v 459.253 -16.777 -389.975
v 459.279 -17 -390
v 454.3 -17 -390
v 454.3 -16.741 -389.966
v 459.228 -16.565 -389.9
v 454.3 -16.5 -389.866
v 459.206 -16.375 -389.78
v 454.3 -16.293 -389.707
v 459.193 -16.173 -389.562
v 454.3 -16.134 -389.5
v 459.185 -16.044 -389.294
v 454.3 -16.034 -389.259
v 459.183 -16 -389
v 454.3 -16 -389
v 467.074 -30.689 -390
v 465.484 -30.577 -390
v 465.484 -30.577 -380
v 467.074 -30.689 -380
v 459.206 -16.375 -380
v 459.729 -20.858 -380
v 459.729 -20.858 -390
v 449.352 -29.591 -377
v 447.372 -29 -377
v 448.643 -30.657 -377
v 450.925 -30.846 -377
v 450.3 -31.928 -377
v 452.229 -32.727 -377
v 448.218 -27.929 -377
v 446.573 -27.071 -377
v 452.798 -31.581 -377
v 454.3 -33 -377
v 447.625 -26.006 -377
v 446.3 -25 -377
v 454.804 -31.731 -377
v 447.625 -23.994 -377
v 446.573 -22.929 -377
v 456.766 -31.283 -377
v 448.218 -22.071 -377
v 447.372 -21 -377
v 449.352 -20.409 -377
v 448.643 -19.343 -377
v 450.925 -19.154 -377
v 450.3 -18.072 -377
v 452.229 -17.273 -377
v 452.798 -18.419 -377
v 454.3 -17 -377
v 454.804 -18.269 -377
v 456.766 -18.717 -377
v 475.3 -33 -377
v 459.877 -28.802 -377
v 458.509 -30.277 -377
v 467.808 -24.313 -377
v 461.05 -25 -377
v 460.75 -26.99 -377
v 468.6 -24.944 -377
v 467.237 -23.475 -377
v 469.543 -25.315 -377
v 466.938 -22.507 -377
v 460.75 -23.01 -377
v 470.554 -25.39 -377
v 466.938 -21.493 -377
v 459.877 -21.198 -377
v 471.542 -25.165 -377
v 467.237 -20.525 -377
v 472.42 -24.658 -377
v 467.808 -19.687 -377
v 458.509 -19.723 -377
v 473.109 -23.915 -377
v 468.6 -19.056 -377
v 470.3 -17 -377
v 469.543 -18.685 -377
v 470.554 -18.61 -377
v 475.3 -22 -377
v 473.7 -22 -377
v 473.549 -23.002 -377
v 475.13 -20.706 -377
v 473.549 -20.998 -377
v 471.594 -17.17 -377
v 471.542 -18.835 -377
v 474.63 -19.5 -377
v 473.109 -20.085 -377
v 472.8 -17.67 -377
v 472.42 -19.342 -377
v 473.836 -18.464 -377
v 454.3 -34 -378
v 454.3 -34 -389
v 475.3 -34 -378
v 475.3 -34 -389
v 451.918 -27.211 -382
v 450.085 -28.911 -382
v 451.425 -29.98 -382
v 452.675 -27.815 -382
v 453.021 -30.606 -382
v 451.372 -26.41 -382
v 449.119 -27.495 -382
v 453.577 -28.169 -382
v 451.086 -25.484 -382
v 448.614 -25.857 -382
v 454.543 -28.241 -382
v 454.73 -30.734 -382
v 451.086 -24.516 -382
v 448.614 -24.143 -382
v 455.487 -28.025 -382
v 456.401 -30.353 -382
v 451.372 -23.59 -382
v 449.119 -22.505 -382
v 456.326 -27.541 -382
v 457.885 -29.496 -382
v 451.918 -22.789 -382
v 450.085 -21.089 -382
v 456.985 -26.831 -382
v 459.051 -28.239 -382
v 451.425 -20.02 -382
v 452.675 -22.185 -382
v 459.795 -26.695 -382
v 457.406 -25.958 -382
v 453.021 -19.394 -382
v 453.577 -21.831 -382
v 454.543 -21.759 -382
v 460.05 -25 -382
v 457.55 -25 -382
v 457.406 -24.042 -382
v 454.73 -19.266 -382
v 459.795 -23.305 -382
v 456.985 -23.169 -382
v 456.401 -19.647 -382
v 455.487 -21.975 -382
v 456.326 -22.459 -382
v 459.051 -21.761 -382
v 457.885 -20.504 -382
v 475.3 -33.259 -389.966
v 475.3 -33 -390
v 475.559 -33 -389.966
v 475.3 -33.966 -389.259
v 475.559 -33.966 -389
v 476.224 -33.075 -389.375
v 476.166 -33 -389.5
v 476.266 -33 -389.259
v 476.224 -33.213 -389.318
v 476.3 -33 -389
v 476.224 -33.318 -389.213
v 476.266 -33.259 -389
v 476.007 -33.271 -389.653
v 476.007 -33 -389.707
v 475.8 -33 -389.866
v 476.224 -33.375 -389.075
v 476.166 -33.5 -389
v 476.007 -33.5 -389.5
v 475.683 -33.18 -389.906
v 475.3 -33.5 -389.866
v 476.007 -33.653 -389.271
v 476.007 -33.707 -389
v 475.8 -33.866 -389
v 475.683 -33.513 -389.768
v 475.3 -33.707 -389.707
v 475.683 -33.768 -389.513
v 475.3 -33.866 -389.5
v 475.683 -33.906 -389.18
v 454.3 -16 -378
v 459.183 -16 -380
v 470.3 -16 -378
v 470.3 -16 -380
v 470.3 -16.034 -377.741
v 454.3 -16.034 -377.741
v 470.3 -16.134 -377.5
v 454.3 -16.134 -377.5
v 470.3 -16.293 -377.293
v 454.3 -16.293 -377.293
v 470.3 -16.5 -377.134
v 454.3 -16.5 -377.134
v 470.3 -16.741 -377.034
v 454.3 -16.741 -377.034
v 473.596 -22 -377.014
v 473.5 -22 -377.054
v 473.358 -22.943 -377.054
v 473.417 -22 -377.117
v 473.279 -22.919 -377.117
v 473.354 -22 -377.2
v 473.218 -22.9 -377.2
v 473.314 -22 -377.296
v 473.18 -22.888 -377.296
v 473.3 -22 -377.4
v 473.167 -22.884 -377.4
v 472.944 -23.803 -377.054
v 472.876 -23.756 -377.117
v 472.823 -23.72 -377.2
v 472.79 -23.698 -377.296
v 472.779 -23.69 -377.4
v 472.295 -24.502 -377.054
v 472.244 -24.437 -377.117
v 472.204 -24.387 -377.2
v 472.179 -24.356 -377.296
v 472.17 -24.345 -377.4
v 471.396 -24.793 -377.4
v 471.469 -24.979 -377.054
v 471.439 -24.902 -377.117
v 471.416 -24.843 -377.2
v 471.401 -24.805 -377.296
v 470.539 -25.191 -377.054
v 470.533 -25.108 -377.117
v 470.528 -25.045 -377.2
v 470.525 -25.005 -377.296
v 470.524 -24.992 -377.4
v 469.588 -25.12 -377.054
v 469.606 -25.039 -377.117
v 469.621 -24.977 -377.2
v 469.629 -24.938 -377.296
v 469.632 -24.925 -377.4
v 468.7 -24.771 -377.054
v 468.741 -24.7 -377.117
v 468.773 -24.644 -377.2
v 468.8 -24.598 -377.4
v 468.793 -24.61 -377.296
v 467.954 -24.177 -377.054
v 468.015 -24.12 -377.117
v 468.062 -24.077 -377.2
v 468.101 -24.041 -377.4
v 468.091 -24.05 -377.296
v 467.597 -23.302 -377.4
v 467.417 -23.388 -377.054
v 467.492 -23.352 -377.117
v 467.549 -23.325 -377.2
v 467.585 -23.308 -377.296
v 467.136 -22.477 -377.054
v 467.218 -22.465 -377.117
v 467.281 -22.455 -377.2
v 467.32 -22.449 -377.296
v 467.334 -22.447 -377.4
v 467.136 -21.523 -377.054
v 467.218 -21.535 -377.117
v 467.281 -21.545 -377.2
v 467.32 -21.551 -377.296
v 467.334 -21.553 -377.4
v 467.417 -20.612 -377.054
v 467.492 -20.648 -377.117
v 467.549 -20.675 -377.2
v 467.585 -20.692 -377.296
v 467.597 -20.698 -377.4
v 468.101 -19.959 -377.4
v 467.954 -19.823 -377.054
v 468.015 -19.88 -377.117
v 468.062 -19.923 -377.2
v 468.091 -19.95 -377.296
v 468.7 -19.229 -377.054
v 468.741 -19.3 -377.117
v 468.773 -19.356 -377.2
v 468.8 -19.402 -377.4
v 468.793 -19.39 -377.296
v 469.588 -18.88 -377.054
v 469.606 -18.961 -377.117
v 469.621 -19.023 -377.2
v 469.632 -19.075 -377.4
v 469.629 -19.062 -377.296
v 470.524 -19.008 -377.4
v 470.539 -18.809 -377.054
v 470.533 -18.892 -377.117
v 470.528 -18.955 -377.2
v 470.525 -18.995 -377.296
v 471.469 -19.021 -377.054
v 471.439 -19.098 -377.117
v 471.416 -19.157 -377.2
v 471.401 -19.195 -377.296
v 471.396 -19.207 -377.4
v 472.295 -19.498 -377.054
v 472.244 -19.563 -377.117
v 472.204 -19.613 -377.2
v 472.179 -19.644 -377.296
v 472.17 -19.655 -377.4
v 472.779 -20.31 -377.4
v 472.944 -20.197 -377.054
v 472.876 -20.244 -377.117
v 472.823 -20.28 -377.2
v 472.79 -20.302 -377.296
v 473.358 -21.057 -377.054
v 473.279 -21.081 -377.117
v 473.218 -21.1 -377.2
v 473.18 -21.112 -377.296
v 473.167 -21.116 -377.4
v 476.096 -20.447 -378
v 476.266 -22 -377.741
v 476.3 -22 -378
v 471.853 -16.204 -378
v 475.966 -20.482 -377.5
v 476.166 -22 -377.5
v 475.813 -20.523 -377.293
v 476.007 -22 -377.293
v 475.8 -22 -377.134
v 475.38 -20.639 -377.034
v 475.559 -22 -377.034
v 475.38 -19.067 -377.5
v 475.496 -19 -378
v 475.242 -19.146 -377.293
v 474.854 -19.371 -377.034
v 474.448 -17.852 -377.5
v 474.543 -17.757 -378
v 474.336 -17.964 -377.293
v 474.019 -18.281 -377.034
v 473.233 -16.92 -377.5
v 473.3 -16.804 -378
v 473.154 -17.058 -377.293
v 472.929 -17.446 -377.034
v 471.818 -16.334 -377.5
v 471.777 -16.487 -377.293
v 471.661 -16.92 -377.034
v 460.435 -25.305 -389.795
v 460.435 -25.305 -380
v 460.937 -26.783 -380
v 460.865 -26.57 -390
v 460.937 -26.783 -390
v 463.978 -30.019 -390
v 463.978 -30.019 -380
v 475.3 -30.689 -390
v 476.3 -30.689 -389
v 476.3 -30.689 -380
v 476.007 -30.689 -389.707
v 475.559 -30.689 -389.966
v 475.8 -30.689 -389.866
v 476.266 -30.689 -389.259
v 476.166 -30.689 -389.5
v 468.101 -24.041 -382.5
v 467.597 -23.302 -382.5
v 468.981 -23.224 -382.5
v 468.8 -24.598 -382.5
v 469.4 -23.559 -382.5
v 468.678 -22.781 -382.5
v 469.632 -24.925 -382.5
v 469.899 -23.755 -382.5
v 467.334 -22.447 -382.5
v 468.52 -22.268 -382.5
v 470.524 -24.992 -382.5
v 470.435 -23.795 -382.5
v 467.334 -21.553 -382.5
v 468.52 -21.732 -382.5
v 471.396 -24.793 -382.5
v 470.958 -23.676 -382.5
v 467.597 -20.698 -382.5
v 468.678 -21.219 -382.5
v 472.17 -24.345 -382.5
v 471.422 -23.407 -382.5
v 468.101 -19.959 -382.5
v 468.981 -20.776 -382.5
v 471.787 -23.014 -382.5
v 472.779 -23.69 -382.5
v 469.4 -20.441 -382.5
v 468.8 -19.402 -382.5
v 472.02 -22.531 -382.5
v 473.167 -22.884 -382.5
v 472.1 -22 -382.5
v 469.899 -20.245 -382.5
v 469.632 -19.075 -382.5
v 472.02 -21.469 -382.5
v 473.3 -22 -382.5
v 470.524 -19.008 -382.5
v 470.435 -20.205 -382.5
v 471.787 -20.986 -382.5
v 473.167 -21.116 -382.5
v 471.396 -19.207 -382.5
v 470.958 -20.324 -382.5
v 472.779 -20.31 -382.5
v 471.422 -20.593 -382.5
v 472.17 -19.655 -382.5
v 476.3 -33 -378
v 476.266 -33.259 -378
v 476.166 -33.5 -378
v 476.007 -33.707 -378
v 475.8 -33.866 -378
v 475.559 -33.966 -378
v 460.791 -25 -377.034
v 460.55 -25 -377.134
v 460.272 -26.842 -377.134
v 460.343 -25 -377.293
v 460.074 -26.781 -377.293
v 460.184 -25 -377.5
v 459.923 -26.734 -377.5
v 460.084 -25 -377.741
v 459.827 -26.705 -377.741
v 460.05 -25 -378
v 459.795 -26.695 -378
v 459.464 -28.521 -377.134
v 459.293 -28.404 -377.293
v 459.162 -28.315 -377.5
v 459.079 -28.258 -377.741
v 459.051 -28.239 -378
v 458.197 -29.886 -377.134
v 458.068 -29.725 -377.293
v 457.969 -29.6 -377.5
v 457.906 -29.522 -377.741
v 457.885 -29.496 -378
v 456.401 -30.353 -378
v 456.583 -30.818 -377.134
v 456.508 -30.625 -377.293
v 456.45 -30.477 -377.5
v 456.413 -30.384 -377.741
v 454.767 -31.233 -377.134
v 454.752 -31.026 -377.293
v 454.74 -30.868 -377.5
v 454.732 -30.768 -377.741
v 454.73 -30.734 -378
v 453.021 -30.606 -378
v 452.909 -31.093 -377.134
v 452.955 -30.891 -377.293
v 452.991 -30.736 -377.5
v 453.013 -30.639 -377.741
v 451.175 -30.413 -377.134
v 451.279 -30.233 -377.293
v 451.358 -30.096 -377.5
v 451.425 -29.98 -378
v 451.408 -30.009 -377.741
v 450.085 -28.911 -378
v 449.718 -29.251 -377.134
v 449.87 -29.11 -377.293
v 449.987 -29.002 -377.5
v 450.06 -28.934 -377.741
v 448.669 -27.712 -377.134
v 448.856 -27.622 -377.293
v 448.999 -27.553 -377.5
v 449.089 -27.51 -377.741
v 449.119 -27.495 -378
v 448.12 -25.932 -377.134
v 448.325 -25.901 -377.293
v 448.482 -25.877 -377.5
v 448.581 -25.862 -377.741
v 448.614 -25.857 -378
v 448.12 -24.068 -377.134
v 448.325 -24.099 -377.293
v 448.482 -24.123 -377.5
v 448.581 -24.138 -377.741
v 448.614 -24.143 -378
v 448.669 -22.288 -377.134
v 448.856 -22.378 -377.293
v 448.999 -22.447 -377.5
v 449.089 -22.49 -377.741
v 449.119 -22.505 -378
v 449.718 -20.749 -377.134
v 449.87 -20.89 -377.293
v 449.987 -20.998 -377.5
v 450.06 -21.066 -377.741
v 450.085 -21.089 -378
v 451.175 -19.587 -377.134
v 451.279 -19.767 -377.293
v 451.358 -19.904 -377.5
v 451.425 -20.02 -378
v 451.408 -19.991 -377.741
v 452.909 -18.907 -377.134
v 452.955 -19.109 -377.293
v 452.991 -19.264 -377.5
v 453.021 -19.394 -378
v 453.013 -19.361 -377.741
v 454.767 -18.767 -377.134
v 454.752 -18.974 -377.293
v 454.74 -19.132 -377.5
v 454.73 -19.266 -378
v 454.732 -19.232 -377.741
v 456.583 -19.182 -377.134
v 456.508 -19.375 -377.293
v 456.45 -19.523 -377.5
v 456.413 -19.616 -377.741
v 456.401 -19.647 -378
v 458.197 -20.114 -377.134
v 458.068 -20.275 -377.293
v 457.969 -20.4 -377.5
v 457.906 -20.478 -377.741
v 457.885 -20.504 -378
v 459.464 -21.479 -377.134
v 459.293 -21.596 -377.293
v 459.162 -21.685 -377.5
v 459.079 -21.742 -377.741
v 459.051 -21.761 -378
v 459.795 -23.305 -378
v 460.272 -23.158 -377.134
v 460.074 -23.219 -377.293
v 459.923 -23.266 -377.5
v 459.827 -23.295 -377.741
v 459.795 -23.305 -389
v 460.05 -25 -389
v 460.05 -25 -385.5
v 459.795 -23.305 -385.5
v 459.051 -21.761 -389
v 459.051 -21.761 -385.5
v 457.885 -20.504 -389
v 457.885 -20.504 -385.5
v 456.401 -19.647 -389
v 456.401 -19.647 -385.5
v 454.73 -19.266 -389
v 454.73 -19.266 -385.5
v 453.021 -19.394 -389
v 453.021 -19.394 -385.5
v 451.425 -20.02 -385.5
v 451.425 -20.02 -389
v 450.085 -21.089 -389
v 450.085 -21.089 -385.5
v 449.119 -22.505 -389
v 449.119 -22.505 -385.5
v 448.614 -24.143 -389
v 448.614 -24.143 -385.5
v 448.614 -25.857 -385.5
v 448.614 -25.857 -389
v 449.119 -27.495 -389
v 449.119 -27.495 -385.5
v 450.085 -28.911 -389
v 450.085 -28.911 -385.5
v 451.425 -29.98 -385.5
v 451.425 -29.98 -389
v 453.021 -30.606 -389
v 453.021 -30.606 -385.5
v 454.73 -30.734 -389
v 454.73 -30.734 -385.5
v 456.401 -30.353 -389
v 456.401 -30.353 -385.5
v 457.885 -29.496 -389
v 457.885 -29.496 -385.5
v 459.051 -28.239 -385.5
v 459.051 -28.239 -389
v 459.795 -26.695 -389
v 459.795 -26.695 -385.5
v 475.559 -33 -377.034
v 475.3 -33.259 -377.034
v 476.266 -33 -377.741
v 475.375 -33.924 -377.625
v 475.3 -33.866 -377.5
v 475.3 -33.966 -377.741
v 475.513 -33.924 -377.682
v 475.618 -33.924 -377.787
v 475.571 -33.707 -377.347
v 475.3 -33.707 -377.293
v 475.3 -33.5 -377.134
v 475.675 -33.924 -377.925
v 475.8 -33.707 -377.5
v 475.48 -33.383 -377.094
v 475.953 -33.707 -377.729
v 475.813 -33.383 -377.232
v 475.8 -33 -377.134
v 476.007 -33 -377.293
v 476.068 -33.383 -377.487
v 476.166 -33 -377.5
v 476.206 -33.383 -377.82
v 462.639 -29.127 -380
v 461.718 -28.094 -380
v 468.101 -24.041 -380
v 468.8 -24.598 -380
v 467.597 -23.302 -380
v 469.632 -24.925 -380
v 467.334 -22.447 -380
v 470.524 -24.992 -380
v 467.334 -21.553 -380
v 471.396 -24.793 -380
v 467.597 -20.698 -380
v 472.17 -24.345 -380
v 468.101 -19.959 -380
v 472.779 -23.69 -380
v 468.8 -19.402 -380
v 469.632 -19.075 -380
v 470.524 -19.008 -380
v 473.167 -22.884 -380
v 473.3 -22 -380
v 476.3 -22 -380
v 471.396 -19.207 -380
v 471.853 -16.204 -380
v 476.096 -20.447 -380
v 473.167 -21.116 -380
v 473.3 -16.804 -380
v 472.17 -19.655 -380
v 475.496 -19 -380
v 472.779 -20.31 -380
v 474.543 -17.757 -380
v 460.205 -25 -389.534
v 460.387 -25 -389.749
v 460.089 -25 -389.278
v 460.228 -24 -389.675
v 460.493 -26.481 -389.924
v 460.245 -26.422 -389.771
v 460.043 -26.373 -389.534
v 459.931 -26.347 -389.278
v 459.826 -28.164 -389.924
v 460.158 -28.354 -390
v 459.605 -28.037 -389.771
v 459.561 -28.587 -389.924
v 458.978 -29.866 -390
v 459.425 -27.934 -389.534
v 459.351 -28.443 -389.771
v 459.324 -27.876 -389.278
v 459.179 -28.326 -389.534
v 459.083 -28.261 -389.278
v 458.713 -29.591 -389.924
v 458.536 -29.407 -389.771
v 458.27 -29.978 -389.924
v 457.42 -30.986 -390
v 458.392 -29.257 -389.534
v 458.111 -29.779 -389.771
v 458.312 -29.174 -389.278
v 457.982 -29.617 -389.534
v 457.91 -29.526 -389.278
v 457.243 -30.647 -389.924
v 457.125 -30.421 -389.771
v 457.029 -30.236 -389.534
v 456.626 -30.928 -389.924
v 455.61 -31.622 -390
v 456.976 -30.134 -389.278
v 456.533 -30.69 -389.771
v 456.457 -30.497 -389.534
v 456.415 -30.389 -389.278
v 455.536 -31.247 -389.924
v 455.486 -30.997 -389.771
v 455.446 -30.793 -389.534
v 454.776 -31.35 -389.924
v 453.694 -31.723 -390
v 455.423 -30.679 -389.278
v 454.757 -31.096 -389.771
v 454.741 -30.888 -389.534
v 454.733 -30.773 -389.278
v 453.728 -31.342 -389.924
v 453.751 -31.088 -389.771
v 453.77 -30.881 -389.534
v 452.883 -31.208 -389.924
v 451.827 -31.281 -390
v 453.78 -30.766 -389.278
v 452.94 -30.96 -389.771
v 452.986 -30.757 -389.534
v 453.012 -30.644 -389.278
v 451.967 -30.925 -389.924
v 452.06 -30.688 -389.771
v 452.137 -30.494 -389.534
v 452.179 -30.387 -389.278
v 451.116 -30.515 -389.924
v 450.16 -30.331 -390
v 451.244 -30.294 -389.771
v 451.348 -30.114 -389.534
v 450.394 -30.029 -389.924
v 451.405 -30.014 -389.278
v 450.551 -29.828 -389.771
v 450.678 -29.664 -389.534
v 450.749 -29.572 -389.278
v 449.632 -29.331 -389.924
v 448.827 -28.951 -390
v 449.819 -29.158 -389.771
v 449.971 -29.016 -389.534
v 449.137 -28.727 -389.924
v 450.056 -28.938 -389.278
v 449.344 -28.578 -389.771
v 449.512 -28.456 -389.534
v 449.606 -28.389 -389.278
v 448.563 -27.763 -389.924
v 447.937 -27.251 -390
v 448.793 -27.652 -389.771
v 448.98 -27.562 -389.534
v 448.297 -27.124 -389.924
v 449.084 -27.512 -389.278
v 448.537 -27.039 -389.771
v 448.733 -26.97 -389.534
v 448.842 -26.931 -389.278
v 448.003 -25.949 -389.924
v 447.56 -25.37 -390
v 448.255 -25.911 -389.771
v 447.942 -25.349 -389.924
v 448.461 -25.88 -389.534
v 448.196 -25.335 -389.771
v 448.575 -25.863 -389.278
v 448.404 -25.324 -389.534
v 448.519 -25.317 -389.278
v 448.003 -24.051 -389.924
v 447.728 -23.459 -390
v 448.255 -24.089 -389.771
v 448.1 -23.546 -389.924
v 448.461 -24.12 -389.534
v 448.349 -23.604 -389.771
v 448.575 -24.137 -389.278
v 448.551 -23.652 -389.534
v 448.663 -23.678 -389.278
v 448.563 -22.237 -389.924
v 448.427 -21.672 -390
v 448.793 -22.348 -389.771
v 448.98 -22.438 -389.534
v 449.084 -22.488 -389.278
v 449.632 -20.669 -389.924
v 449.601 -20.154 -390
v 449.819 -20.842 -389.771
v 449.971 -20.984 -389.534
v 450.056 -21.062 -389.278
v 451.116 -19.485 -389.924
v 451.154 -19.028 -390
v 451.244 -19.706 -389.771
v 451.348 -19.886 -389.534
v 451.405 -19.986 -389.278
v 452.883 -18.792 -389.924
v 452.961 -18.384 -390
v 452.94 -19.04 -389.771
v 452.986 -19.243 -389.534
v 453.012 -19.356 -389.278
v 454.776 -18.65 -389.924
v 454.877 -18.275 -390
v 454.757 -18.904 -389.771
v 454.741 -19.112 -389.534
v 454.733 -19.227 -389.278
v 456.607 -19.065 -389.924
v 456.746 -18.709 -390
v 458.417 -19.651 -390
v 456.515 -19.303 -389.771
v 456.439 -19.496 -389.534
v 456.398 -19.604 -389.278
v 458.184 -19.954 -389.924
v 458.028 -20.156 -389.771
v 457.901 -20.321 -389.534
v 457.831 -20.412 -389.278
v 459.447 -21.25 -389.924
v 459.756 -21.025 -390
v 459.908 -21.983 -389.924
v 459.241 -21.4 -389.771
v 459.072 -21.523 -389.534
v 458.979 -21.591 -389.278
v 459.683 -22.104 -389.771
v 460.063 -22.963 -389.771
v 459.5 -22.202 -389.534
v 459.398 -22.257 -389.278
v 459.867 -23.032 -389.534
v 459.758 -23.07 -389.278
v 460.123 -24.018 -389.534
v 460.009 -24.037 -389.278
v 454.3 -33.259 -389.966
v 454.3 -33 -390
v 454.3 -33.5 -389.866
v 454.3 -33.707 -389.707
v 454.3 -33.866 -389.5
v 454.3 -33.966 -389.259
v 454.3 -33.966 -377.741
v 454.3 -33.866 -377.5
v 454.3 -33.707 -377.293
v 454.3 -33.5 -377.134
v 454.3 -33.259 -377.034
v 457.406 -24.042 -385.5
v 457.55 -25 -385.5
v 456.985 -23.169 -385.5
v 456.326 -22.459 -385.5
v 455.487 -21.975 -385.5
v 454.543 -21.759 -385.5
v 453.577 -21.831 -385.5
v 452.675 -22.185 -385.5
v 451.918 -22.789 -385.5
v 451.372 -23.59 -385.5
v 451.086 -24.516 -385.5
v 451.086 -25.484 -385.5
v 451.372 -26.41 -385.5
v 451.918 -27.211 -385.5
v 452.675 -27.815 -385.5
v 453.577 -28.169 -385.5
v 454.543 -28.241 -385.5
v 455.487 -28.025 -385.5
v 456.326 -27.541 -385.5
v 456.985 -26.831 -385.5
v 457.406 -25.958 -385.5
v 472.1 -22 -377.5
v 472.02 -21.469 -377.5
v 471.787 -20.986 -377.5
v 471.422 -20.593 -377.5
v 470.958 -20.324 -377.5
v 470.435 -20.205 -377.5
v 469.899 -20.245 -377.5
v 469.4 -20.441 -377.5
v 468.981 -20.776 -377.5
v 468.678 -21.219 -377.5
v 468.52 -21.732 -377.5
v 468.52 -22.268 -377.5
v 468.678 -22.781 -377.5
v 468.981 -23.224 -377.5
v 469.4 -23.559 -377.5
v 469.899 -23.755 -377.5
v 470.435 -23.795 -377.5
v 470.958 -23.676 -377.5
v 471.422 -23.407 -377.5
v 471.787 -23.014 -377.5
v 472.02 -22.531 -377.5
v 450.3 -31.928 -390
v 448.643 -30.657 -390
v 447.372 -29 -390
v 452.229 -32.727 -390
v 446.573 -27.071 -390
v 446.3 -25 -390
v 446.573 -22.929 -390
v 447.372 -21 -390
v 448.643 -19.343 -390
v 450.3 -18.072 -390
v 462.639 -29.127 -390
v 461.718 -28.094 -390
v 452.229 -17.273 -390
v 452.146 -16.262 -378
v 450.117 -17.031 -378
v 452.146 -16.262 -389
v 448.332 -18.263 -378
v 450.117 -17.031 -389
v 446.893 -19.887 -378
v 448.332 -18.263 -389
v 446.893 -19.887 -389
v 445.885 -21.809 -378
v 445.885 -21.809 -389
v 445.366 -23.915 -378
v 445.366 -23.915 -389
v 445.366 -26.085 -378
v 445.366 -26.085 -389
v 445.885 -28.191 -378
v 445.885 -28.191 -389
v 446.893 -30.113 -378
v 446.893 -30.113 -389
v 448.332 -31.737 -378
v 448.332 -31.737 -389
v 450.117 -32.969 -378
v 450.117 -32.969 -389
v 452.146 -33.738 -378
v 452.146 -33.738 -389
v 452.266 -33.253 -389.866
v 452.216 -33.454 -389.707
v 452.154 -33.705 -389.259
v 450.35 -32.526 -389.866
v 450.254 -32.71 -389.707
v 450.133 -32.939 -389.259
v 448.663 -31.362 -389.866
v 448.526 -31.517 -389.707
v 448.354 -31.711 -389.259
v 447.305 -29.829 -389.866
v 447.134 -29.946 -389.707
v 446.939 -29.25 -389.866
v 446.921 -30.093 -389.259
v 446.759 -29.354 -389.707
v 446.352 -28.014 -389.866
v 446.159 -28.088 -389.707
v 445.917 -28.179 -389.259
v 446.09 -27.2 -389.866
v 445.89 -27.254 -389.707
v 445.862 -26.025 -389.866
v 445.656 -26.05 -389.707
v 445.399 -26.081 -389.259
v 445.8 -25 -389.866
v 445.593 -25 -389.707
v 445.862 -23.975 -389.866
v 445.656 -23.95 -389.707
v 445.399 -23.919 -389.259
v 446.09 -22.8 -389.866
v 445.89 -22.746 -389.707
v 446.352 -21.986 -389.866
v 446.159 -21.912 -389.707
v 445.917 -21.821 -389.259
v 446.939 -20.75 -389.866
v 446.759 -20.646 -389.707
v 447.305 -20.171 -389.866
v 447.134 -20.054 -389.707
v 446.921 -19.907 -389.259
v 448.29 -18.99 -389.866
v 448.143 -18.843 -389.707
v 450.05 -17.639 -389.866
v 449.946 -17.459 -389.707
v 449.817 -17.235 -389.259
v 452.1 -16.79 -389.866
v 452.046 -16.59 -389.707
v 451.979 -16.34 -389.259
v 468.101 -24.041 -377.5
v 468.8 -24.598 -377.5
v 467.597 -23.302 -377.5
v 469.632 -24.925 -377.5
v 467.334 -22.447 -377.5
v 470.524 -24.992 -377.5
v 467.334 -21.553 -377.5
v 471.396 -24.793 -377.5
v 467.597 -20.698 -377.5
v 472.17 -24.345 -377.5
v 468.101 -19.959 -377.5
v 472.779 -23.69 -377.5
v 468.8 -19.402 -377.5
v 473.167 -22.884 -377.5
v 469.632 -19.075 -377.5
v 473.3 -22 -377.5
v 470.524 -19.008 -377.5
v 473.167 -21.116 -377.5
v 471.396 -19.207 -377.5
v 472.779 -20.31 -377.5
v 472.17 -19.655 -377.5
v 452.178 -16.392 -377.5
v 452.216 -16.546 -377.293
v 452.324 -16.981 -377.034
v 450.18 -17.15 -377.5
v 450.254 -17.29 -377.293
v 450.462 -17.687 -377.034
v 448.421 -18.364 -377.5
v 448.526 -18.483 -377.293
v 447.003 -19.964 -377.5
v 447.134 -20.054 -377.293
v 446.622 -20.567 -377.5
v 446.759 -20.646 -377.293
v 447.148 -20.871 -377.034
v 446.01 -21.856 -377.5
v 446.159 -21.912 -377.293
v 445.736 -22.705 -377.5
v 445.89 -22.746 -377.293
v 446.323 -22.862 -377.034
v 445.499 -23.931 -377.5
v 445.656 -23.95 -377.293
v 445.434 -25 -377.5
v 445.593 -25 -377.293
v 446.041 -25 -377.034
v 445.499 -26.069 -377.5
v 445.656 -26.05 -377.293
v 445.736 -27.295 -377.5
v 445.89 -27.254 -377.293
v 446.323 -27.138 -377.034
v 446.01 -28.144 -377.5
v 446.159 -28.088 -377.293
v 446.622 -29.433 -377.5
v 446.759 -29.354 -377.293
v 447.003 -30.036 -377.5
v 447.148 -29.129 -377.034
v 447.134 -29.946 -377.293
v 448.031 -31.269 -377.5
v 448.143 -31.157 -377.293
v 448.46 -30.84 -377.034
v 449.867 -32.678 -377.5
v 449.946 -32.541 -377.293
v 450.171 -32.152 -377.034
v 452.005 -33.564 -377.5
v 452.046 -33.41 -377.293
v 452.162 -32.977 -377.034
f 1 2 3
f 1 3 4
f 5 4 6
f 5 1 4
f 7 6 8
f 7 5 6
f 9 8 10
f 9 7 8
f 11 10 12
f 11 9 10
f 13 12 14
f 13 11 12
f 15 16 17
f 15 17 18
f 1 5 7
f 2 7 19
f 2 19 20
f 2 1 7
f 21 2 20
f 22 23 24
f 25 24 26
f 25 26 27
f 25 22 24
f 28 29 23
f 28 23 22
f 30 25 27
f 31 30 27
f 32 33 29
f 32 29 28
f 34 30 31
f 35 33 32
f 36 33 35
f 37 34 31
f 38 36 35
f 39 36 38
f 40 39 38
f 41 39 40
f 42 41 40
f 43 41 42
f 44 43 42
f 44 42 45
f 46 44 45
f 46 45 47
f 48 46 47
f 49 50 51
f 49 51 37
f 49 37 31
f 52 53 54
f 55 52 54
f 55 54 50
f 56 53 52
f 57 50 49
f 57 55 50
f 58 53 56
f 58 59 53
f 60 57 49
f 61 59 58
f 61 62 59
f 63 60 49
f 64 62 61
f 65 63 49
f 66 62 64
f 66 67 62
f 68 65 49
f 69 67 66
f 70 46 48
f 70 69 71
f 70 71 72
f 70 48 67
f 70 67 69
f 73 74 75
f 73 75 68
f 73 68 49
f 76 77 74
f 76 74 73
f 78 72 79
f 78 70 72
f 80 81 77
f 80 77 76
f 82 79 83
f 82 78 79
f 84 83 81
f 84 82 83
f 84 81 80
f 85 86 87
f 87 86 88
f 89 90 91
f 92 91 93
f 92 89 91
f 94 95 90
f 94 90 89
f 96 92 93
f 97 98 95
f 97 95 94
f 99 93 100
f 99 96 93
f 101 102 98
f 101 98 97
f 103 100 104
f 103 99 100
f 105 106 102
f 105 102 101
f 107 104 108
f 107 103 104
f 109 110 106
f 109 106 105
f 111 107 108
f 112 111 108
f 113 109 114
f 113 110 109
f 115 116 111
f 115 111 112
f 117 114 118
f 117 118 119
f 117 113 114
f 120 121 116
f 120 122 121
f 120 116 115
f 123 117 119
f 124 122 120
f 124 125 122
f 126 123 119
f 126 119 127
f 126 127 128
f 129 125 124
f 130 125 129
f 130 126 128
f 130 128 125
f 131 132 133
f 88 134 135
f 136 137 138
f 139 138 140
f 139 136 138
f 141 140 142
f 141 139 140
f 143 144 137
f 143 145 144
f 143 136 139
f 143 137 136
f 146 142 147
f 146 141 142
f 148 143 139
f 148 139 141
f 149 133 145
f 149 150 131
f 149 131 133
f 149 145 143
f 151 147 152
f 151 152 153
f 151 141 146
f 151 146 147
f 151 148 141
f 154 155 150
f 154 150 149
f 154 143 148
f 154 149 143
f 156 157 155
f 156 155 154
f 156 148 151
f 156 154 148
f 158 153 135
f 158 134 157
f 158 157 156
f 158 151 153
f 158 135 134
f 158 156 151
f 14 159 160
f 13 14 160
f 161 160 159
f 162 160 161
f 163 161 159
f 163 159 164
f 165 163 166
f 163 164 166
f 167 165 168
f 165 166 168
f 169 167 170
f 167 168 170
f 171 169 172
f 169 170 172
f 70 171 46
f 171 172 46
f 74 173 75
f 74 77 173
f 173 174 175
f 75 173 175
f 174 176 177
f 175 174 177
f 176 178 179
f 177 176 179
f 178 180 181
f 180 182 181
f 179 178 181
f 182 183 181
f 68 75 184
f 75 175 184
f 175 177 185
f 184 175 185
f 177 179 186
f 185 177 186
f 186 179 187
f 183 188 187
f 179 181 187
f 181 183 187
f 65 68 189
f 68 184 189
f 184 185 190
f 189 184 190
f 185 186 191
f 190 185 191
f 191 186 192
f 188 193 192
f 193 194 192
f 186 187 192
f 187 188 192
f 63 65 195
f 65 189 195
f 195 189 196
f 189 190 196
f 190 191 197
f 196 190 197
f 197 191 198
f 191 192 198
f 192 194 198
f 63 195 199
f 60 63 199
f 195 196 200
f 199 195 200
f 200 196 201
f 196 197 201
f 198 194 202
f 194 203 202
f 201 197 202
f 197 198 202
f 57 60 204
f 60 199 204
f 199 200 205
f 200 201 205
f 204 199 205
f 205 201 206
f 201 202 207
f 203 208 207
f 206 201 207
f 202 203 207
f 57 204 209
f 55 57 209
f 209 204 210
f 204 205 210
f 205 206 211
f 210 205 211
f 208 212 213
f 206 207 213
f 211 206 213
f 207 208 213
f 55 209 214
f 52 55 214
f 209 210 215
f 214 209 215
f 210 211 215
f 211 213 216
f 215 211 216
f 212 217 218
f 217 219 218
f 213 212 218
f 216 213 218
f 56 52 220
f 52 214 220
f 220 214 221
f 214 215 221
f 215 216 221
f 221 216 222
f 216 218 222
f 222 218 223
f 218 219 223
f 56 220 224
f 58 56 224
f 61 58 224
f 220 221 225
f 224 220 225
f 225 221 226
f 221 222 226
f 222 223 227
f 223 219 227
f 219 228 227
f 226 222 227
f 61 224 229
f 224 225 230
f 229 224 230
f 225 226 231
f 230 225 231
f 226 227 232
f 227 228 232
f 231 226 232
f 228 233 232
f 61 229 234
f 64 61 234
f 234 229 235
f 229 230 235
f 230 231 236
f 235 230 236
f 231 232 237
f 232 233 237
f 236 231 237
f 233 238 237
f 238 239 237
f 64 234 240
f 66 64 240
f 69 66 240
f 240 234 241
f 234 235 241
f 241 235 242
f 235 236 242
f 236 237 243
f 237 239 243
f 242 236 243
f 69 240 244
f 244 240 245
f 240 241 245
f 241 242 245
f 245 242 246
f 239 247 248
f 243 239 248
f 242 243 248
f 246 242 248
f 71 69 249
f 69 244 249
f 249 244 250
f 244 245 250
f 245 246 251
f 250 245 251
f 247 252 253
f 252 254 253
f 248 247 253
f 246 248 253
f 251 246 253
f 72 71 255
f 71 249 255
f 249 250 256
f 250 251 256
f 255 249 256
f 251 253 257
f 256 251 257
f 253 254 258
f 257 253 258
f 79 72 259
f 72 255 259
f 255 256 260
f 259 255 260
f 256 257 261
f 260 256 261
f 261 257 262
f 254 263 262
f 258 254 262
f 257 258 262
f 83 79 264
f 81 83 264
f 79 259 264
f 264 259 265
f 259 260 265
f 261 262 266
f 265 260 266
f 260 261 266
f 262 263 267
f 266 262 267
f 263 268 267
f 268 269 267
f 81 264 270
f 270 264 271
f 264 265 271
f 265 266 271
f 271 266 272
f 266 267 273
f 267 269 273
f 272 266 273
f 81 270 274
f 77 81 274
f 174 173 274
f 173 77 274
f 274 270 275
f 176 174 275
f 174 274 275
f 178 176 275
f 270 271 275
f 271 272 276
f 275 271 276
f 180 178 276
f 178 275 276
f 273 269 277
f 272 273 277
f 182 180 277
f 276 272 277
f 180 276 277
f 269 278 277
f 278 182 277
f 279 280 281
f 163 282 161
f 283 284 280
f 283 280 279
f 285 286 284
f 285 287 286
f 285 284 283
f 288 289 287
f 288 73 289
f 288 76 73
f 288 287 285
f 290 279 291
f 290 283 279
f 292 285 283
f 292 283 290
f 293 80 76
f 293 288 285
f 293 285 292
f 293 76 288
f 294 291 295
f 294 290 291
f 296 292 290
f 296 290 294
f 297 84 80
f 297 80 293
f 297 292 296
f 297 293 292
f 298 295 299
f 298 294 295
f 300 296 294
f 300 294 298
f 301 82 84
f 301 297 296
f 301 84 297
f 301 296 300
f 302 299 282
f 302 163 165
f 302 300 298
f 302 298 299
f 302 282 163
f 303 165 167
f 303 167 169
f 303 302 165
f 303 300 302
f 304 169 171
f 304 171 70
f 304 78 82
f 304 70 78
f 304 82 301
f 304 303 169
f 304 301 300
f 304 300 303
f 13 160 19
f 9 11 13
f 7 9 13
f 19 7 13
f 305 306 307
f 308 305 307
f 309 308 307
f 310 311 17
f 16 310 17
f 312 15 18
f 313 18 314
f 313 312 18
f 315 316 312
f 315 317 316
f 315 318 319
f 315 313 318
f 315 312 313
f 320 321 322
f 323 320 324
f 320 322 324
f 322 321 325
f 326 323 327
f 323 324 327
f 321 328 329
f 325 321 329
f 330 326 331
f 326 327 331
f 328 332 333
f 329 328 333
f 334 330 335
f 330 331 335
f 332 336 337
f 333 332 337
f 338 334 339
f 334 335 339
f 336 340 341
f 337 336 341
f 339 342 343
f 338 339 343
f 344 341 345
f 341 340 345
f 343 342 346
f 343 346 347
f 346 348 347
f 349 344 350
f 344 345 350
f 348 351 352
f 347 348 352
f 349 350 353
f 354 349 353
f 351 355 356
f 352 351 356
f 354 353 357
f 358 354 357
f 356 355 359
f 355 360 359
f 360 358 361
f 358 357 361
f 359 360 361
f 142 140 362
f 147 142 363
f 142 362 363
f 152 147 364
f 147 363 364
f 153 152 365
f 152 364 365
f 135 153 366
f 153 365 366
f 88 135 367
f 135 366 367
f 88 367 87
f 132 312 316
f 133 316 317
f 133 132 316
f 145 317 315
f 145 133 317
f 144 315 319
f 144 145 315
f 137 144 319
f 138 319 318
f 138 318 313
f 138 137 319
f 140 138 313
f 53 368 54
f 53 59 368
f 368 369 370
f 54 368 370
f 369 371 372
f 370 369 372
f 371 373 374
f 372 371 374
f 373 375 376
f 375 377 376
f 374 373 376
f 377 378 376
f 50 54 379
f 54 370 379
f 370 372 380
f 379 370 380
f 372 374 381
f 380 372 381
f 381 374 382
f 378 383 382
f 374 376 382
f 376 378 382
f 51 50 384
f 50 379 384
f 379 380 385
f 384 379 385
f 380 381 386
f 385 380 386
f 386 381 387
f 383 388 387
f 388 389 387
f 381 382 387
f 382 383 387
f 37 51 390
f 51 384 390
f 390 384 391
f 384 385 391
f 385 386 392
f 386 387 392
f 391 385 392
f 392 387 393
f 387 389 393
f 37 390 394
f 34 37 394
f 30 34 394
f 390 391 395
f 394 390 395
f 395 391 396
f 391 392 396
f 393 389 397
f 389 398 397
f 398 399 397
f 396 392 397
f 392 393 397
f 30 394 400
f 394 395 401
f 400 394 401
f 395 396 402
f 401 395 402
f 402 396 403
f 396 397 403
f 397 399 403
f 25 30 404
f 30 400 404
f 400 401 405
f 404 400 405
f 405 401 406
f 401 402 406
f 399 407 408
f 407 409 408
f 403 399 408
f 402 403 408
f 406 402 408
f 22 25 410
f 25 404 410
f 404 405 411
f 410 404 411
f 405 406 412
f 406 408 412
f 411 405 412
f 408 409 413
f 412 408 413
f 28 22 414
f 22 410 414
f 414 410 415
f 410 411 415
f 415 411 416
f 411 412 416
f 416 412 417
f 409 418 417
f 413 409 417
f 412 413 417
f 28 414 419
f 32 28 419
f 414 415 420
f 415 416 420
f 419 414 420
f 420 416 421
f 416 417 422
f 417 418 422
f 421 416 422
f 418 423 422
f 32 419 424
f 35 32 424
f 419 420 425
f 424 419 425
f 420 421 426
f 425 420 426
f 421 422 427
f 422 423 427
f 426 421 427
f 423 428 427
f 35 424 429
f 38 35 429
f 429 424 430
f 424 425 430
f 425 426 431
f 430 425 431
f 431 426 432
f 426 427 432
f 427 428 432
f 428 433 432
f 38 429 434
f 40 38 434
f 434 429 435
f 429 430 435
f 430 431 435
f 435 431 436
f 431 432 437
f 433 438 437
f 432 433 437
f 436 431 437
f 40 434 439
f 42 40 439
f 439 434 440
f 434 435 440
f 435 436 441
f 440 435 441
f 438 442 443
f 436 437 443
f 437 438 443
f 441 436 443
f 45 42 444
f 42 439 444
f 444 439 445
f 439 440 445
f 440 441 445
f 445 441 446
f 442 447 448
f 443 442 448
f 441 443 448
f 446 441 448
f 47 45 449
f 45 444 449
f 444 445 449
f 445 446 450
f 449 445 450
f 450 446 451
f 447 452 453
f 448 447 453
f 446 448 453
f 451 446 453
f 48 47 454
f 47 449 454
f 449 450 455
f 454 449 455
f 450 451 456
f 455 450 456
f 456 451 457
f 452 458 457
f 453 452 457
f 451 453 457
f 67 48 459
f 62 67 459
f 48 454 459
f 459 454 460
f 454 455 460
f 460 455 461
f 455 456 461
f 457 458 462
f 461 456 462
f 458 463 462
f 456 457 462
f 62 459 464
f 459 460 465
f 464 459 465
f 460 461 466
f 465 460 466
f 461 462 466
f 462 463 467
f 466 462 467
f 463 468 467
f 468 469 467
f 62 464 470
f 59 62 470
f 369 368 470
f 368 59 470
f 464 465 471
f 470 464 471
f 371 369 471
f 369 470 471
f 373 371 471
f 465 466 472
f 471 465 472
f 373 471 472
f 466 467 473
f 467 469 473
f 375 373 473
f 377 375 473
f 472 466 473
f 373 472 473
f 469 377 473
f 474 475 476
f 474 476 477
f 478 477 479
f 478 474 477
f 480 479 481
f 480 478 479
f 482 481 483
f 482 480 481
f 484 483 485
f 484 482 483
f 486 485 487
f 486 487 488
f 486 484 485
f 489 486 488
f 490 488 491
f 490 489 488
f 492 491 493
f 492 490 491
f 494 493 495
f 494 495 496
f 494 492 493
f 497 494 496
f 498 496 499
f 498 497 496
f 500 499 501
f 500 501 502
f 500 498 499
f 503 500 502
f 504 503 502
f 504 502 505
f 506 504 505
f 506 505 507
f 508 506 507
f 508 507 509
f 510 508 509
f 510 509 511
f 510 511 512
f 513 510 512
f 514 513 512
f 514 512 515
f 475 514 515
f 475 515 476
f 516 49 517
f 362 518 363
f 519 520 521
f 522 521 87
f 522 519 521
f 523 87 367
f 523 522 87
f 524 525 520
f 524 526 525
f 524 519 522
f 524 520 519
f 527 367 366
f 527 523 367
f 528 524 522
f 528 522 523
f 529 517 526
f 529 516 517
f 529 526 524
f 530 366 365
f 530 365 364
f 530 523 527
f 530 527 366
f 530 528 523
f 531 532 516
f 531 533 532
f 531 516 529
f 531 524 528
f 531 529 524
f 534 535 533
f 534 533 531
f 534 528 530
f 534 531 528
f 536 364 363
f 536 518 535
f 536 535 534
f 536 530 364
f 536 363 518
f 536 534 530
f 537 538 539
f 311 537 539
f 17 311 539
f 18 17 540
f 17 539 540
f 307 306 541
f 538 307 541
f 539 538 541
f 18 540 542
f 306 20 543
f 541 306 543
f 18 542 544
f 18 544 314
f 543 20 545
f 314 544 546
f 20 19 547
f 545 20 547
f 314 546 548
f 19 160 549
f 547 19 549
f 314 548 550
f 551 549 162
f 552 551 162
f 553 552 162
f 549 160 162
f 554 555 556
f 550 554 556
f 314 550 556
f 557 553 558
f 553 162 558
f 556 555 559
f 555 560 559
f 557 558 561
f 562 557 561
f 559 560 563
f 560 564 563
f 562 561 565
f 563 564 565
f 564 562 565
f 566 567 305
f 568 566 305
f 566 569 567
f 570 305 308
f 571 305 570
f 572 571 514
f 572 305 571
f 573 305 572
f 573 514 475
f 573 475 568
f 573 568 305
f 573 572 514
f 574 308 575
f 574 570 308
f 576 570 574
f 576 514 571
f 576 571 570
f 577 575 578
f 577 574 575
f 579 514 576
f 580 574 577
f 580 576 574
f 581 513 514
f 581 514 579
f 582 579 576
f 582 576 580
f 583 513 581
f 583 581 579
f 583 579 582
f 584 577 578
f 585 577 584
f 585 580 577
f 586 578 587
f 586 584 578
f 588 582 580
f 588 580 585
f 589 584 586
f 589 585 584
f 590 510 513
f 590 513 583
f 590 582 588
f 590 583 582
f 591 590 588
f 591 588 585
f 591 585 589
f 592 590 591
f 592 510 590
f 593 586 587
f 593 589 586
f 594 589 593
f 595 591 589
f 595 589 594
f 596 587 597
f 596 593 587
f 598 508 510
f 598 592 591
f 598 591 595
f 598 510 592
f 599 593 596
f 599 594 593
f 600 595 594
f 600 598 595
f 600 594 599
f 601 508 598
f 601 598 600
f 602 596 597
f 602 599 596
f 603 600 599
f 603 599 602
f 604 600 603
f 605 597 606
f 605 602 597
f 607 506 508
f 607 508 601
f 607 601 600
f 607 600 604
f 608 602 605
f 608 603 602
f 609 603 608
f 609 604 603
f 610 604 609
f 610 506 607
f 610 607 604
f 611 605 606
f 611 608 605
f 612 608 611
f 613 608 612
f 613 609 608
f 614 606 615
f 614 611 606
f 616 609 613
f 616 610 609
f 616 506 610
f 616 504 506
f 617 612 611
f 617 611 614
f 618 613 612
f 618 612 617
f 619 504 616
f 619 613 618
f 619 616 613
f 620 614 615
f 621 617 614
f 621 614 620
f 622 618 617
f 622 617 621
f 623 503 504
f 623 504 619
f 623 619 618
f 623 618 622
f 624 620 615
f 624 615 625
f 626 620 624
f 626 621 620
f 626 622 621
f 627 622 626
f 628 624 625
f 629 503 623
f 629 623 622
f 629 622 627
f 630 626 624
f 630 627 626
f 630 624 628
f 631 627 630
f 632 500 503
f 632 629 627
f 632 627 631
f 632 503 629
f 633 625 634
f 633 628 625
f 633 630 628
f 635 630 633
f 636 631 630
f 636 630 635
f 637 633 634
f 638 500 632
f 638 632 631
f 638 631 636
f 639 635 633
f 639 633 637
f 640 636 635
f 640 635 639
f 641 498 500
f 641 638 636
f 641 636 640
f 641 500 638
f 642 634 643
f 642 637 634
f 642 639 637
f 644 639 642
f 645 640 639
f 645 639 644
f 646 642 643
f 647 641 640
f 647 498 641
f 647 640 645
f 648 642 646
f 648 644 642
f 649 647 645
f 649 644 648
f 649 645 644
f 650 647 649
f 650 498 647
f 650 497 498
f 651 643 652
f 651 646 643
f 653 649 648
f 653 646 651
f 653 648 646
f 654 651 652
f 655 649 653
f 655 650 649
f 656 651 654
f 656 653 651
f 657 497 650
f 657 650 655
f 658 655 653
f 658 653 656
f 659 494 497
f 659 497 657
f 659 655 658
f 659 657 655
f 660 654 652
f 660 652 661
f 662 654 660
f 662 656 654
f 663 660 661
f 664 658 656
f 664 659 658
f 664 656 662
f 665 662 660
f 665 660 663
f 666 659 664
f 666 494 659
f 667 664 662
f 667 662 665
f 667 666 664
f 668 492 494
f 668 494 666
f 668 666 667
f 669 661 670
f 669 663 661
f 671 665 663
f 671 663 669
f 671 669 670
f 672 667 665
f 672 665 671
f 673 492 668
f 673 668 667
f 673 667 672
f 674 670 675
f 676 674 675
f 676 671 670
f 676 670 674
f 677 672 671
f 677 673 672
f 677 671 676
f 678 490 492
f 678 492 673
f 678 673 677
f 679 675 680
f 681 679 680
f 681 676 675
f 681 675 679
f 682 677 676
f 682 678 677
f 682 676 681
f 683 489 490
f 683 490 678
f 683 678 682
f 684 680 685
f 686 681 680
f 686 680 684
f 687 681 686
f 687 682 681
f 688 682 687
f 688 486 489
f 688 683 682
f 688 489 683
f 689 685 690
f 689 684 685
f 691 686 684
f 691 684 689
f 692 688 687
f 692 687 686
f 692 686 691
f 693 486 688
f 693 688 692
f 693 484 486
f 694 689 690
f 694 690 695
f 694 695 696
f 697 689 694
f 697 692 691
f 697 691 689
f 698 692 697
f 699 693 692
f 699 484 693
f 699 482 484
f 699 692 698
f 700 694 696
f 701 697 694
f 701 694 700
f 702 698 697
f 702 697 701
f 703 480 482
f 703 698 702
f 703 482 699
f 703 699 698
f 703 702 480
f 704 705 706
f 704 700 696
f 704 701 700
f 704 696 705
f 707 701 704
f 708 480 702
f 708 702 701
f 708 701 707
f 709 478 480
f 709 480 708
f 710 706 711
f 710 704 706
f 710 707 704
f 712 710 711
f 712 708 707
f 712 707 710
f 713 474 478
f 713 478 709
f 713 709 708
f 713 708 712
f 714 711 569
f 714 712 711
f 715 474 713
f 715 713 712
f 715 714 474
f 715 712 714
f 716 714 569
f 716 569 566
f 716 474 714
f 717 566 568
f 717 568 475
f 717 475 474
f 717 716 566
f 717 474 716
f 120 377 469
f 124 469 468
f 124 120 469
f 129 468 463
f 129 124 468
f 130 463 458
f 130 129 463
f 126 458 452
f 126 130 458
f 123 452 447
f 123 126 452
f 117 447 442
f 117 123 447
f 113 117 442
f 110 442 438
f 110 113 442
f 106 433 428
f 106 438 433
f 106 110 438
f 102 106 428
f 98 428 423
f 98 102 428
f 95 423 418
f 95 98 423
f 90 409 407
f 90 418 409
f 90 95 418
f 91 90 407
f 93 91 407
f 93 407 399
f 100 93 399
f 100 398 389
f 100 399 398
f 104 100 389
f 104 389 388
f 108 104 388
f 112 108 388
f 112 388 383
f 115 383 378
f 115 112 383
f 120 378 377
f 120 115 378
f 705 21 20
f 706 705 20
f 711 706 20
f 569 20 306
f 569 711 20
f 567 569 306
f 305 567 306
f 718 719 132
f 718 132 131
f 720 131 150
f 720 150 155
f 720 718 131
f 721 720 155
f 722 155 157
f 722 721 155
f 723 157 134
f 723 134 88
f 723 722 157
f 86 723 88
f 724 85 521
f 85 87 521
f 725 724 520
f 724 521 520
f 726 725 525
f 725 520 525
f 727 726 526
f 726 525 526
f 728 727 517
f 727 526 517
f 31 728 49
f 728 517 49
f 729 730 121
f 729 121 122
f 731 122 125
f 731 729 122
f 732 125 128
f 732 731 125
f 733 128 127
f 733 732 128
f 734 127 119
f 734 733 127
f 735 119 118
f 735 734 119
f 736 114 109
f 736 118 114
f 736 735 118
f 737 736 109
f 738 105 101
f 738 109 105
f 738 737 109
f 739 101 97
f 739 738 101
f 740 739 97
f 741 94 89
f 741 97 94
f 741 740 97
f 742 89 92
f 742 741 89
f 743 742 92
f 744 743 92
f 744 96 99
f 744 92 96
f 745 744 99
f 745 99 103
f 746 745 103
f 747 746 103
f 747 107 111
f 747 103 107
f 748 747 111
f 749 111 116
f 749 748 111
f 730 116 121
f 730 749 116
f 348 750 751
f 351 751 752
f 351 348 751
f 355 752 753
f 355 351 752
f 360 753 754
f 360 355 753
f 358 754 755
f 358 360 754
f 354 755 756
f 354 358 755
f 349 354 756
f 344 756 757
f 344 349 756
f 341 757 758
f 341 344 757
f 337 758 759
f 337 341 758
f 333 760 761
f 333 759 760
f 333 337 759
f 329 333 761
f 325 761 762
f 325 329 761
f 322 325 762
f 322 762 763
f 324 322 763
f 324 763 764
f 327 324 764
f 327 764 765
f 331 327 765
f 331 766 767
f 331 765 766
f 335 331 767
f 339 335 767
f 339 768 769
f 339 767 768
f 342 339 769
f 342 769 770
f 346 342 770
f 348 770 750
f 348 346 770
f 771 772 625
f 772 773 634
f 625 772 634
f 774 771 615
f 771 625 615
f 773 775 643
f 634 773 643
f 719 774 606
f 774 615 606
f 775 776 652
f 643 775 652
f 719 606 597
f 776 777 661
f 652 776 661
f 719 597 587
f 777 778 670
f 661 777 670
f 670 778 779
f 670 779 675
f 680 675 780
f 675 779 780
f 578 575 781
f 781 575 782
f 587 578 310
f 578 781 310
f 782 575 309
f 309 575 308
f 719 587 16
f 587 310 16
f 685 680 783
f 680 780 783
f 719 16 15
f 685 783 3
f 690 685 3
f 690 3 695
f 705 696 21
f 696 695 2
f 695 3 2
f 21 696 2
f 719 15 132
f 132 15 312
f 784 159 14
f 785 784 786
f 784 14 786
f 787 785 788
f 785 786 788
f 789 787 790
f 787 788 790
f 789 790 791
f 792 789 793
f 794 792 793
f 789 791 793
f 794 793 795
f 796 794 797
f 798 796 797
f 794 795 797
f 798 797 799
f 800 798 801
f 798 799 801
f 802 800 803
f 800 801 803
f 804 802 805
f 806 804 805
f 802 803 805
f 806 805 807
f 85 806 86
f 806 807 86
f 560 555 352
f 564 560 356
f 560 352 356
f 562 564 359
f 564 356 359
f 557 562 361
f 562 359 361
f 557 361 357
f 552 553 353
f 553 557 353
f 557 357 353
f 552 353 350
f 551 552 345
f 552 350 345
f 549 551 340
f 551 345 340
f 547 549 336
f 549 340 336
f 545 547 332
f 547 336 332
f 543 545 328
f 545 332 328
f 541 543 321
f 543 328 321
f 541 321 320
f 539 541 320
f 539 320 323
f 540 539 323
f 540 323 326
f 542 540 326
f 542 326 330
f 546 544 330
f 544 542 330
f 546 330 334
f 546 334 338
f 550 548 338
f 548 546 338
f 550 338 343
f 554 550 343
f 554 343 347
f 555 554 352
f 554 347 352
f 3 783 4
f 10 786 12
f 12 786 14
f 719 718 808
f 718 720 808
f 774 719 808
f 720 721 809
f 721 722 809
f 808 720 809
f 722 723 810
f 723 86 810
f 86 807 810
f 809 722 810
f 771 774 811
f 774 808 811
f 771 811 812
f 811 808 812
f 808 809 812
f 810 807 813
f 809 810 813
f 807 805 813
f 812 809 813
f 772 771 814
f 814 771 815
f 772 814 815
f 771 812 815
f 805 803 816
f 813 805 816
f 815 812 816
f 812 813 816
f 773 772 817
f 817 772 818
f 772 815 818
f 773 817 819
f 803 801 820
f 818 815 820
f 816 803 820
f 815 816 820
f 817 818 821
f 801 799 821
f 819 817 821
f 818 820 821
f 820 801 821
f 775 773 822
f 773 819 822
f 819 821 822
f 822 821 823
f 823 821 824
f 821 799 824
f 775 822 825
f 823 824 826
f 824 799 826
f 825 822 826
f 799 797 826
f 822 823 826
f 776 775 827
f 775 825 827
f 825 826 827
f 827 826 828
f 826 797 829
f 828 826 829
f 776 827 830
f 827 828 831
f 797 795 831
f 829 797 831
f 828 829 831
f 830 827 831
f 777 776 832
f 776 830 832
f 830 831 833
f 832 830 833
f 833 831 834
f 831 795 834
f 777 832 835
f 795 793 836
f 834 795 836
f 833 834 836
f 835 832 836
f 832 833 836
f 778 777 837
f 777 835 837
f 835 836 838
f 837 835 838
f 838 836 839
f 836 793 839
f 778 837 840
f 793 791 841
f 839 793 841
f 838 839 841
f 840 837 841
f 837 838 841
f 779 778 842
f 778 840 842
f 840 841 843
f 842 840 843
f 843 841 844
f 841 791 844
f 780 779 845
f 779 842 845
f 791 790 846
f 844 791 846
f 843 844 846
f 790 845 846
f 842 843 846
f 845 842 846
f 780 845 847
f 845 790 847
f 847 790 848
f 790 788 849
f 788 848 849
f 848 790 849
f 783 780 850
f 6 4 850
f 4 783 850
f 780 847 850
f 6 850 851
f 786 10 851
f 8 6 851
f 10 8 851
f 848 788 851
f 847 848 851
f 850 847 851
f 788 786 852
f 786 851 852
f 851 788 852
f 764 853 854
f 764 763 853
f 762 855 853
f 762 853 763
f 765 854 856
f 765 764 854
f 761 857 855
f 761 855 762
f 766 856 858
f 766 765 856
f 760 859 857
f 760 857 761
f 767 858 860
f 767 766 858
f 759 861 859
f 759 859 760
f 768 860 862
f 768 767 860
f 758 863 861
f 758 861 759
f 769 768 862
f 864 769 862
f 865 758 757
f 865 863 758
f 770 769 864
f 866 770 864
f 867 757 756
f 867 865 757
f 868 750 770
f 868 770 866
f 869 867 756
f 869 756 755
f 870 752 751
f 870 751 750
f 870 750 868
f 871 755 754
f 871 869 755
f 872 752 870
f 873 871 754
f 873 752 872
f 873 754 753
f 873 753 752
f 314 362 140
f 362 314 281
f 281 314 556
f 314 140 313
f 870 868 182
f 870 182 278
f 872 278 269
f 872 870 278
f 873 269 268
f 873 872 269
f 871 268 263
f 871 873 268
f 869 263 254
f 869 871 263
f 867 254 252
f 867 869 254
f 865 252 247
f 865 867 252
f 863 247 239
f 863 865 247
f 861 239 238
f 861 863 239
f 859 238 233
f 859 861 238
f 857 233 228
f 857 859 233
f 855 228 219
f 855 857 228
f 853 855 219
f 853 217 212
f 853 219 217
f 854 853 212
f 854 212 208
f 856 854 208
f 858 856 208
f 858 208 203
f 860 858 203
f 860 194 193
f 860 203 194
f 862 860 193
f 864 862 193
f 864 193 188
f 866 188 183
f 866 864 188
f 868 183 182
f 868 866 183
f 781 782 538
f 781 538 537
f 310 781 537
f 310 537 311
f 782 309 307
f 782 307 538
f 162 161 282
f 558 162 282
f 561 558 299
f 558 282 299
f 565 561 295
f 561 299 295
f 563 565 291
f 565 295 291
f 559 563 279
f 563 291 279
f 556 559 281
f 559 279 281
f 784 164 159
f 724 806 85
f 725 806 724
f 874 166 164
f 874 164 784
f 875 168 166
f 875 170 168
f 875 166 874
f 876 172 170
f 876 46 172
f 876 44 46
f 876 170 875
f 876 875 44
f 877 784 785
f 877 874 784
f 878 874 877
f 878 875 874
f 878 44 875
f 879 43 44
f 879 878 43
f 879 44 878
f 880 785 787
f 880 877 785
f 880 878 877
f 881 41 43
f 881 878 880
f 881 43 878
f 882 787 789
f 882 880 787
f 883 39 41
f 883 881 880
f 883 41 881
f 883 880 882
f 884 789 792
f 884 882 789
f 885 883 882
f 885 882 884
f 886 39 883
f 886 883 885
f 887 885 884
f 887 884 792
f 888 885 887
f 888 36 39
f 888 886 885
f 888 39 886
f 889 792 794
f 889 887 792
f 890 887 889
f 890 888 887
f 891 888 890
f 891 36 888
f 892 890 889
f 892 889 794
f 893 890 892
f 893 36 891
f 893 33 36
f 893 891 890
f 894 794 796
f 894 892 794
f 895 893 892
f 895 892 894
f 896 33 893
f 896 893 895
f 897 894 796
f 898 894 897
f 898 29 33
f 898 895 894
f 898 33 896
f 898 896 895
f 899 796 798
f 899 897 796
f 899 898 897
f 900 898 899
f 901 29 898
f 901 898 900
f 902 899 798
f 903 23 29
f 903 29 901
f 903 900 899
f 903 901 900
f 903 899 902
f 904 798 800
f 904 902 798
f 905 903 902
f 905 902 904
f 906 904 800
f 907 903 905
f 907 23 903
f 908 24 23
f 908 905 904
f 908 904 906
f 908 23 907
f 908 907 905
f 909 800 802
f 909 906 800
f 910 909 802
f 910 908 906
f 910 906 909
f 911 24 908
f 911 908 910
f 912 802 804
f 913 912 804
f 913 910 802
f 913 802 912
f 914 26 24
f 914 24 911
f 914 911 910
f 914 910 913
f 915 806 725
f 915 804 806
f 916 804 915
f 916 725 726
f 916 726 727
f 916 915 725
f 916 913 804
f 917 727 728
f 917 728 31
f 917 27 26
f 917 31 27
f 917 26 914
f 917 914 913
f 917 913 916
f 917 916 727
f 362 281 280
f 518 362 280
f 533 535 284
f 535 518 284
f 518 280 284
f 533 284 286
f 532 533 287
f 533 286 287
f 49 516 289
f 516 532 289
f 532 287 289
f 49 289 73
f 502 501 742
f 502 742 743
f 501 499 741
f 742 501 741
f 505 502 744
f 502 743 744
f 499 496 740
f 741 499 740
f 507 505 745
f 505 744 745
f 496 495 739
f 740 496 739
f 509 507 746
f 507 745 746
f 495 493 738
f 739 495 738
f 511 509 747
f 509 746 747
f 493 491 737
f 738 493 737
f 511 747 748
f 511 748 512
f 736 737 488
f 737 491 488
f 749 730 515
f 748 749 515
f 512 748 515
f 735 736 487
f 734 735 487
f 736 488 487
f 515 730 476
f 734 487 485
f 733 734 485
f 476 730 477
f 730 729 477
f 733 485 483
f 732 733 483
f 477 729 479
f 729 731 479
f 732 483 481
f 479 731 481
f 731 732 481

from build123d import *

# Parameters (mm, degrees)
CYLINDER114_R     = 1.8
CYLINDER114_DEPTH = 7
CYLINDER115_R     = 3
CYLINDER115_DEPTH = 7
PAD_DEPTH         = 30
BOX002_W          = 10
BOX002_H          = 10
BOX002_DEPTH      = 10
BOX003_W          = 17
BOX003_H          = 10
BOX003_DEPTH      = 10
CYLINDER018_R     = 5.75
CYLINDER018_DEPTH = 10
CYLINDER017_R     = 3.25
CYLINDER017_DEPTH = 10
CYLINDER113_R     = 5.75
CYLINDER113_DEPTH = 10
CYLINDER112_R     = 3.25
CYLINDER112_DEPTH = 10
BOX_W             = 22
BOX_H             = 18
BOX_DEPTH         = 13
CYLINDER111_R     = 9
CYLINDER111_DEPTH = 13
FILLET038_R       = 6
FILLET001_R       = 1
FILLET002_R       = 1
FILLET003_R       = 1
CYLINDER019_R     = 3
CYLINDER019_DEPTH = 3
FILLET004_R       = 0.4


with BuildPart() as m3cut:
    # Cylinder114 → Cylinder114 (new body)
    with BuildSketch(Plane(origin=(-4.5, -22, 62.5), x_dir=(1, 0, 0), z_dir=(0, 0, 1))):
        Circle(CYLINDER114_R)
    extrude(amount=CYLINDER114_DEPTH)


with BuildPart() as fusion009:
    # Cylinder115 → Cylinder115 (new body)
    with BuildSketch(Plane(origin=(-4.5, -22, 67.5), x_dir=(1, 0, 0), z_dir=(0, 0, 1))):
        Circle(CYLINDER115_R)
    extrude(amount=CYLINDER115_DEPTH)

    # Fusion009: union m3Cut
    add(m3cut.part)


with BuildPart() as body012:
    # Sketch066 → Pad (new body)
    with BuildSketch(Plane.XY):
        Polygon((-15.594093, -16.374565), (-15.071085, -20.857502), (-14.364655, -25.305099), (-13.862565, -26.78348), (-13.081532, -28.094496), (-12.161032, -29.126572), (-10.822123, -30.019178), (-9.315848, -30.577057), (-7.725893, -30.688633), (7.476312, -30.688633), (-15.876865, 6.281797), (-15.876865, -11.843776), align=None)
    extrude(amount=PAD_DEPTH)

    # Box002 → Box002 (join)
    with BuildSketch(Plane.XY):
        with Locations((5, 5)):
            Rectangle(BOX002_W, BOX002_H)
    extrude(amount=BOX002_DEPTH)


with BuildPart() as body012_1:
    # Body placement: moved
    add(body012.part.moved(Location((0, 0, 35))))


with BuildPart() as firstcuts:
    # Box003 → Box003 (new body)
    with BuildSketch(Plane(origin=(-10, -24, 55), x_dir=(1, 0, 0), z_dir=(0, 0, 1))):
        with Locations((8.5, 5)):
            Rectangle(BOX003_W, BOX003_H)
    extrude(amount=BOX003_DEPTH)

    # Fusion007: union Body012
    add(body012_1.part)


with BuildPart() as antennain005:
    # Cylinder018 → Cylinder018 (new body)
    with BuildSketch(Plane(origin=(-23, 0, 69), x_dir=(1, 0, 0), z_dir=(0, 0, 1))):
        Circle(CYLINDER018_R)
    extrude(amount=CYLINDER018_DEPTH)


with BuildPart() as fusion065:
    # Cylinder017 → Cylinder017 (new body)
    with BuildSketch(Plane(origin=(-23, 0, 65), x_dir=(1, 0, 0), z_dir=(0, 0, 1))):
        Circle(CYLINDER017_R)
    extrude(amount=CYLINDER017_DEPTH)

    # Fusion065: union antennaIn005
    add(antennain005.part)


with BuildPart() as fusion065_1:
    # Fusion065 placement: moved
    add(fusion065.part.moved(Location((2.5, -25, -19.5))))


with BuildPart() as antennain003:
    # Cylinder113 → Cylinder113 (new body)
    with BuildSketch(Plane(origin=(-23, 0, 69), x_dir=(1, 0, 0), z_dir=(0, 0, 1))):
        Circle(CYLINDER113_R)
    extrude(amount=CYLINDER113_DEPTH)


with BuildPart() as antennacuts:
    # Cylinder112 → Cylinder112 (new body)
    with BuildSketch(Plane(origin=(-23, 0, 65), x_dir=(1, 0, 0), z_dir=(0, 0, 1))):
        Circle(CYLINDER112_R)
    extrude(amount=CYLINDER112_DEPTH)

    # Fusion064: union antennaIn003
    add(antennain003.part)


with BuildPart() as antennacuts_1:
    # Fusion064 placement: moved
    add(antennacuts.part.moved(Location((2.5, -25, -6))))

    # Fusion006: union Fusion065
    add(fusion065_1.part)


with BuildPart() as cube:
    # Box → Box (new body)
    with BuildSketch(Plane(origin=(-20.5, -34, 56), x_dir=(1, 0, 0), z_dir=(0, 0, 1))):
        with Locations((11, 9)):
            Rectangle(BOX_W, BOX_H)
    extrude(amount=BOX_DEPTH)


with BuildPart() as cut001:
    # Cylinder111 → Cylinder111 (new body)
    with BuildSketch(Plane(origin=(-20.5, -25, 56), x_dir=(1, 0, 0), z_dir=(0, 0, 1))):
        Circle(CYLINDER111_R)
    extrude(amount=CYLINDER111_DEPTH)

    # Fusion063: union Cube
    add(cube.part)


with BuildPart() as cut001_1:
    # Fusion063 placement: moved
    add(cut001.part.moved(Location((0, 0, -1))))

    # Fillet038
    fillet038_edges = [cut001_1.edges().sort_by_distance(p)[0] for p in [
        (1.5, -16, 61.5),
    ]]
    fillet(fillet038_edges, radius=FILLET038_R)

    # Fillet001
    fillet001_edges = [cut001_1.edges().sort_by_distance(p)[0] for p in [
        (-12.5, -16, 55),
        (1.5, -28, 55),
        (-14.136039, -31.363961, 55),
        (-20.5, -16, 61.5),
        (1.5, -28, 68),
        (1.5, -34, 61.5),
        (-9.5, -34, 68),
        (-29.5, -25, 55),
        (-29.5, -25, 68),
    ]]
    fillet(fillet001_edges, radius=FILLET001_R)

    # Cut029: cut antennaCuts
    add(antennacuts_1.part, mode=Mode.SUBTRACT)

    # Fillet002
    fillet002_edges = [cut001_1.edges().sort_by_distance(p)[0] for p in [
        (-16.434136, -29.065864, 68),
        (-16.434136, -20.934136, 68),
    ]]
    fillet(fillet002_edges, radius=FILLET002_R)

    # Fillet003
    fillet003_edges = [cut001_1.edges().sort_by_distance(p)[0] for p in [
        (0.5, -27.5, 55),
        (1.207107, -33, 55.292893),
        (-26.25, -25, 55),
    ]]
    fillet(fillet003_edges, radius=FILLET003_R)

    # Cut001: cut firstCuts
    add(firstcuts.part, mode=Mode.SUBTRACT)


with BuildPart() as antennaholder:
    # Cylinder019 → Cylinder019 (new body)
    with BuildSketch(Plane(origin=(-4.5, -22, 62.5), x_dir=(1, 0, 0), z_dir=(0, 0, 1))):
        Circle(CYLINDER019_R)
    extrude(amount=CYLINDER019_DEPTH)

    # Fusion008: union Cut001
    add(cut001_1.part)

    # Cut002: cut Fusion009
    add(fusion009.part, mode=Mode.SUBTRACT)


with BuildPart() as antennaholder_1:
    # Cut002 placement: moved
    add(antennaholder.part.moved(Location((74.8, 0, -176.8))))

    # Fillet004
    fillet004_edges = [antennaholder_1.edges().sort_by_distance(p)[0] for p in [
        (67.3, -22, -108.8),
    ]]
    fillet(fillet004_edges, radius=FILLET004_R)


with BuildPart() as antennaholder_2:
    # Fillet004 placement: moved
    add(antennaholder_1.part.moved(Location((400, 0, -268.2))))


solid = antennaholder_2.part
